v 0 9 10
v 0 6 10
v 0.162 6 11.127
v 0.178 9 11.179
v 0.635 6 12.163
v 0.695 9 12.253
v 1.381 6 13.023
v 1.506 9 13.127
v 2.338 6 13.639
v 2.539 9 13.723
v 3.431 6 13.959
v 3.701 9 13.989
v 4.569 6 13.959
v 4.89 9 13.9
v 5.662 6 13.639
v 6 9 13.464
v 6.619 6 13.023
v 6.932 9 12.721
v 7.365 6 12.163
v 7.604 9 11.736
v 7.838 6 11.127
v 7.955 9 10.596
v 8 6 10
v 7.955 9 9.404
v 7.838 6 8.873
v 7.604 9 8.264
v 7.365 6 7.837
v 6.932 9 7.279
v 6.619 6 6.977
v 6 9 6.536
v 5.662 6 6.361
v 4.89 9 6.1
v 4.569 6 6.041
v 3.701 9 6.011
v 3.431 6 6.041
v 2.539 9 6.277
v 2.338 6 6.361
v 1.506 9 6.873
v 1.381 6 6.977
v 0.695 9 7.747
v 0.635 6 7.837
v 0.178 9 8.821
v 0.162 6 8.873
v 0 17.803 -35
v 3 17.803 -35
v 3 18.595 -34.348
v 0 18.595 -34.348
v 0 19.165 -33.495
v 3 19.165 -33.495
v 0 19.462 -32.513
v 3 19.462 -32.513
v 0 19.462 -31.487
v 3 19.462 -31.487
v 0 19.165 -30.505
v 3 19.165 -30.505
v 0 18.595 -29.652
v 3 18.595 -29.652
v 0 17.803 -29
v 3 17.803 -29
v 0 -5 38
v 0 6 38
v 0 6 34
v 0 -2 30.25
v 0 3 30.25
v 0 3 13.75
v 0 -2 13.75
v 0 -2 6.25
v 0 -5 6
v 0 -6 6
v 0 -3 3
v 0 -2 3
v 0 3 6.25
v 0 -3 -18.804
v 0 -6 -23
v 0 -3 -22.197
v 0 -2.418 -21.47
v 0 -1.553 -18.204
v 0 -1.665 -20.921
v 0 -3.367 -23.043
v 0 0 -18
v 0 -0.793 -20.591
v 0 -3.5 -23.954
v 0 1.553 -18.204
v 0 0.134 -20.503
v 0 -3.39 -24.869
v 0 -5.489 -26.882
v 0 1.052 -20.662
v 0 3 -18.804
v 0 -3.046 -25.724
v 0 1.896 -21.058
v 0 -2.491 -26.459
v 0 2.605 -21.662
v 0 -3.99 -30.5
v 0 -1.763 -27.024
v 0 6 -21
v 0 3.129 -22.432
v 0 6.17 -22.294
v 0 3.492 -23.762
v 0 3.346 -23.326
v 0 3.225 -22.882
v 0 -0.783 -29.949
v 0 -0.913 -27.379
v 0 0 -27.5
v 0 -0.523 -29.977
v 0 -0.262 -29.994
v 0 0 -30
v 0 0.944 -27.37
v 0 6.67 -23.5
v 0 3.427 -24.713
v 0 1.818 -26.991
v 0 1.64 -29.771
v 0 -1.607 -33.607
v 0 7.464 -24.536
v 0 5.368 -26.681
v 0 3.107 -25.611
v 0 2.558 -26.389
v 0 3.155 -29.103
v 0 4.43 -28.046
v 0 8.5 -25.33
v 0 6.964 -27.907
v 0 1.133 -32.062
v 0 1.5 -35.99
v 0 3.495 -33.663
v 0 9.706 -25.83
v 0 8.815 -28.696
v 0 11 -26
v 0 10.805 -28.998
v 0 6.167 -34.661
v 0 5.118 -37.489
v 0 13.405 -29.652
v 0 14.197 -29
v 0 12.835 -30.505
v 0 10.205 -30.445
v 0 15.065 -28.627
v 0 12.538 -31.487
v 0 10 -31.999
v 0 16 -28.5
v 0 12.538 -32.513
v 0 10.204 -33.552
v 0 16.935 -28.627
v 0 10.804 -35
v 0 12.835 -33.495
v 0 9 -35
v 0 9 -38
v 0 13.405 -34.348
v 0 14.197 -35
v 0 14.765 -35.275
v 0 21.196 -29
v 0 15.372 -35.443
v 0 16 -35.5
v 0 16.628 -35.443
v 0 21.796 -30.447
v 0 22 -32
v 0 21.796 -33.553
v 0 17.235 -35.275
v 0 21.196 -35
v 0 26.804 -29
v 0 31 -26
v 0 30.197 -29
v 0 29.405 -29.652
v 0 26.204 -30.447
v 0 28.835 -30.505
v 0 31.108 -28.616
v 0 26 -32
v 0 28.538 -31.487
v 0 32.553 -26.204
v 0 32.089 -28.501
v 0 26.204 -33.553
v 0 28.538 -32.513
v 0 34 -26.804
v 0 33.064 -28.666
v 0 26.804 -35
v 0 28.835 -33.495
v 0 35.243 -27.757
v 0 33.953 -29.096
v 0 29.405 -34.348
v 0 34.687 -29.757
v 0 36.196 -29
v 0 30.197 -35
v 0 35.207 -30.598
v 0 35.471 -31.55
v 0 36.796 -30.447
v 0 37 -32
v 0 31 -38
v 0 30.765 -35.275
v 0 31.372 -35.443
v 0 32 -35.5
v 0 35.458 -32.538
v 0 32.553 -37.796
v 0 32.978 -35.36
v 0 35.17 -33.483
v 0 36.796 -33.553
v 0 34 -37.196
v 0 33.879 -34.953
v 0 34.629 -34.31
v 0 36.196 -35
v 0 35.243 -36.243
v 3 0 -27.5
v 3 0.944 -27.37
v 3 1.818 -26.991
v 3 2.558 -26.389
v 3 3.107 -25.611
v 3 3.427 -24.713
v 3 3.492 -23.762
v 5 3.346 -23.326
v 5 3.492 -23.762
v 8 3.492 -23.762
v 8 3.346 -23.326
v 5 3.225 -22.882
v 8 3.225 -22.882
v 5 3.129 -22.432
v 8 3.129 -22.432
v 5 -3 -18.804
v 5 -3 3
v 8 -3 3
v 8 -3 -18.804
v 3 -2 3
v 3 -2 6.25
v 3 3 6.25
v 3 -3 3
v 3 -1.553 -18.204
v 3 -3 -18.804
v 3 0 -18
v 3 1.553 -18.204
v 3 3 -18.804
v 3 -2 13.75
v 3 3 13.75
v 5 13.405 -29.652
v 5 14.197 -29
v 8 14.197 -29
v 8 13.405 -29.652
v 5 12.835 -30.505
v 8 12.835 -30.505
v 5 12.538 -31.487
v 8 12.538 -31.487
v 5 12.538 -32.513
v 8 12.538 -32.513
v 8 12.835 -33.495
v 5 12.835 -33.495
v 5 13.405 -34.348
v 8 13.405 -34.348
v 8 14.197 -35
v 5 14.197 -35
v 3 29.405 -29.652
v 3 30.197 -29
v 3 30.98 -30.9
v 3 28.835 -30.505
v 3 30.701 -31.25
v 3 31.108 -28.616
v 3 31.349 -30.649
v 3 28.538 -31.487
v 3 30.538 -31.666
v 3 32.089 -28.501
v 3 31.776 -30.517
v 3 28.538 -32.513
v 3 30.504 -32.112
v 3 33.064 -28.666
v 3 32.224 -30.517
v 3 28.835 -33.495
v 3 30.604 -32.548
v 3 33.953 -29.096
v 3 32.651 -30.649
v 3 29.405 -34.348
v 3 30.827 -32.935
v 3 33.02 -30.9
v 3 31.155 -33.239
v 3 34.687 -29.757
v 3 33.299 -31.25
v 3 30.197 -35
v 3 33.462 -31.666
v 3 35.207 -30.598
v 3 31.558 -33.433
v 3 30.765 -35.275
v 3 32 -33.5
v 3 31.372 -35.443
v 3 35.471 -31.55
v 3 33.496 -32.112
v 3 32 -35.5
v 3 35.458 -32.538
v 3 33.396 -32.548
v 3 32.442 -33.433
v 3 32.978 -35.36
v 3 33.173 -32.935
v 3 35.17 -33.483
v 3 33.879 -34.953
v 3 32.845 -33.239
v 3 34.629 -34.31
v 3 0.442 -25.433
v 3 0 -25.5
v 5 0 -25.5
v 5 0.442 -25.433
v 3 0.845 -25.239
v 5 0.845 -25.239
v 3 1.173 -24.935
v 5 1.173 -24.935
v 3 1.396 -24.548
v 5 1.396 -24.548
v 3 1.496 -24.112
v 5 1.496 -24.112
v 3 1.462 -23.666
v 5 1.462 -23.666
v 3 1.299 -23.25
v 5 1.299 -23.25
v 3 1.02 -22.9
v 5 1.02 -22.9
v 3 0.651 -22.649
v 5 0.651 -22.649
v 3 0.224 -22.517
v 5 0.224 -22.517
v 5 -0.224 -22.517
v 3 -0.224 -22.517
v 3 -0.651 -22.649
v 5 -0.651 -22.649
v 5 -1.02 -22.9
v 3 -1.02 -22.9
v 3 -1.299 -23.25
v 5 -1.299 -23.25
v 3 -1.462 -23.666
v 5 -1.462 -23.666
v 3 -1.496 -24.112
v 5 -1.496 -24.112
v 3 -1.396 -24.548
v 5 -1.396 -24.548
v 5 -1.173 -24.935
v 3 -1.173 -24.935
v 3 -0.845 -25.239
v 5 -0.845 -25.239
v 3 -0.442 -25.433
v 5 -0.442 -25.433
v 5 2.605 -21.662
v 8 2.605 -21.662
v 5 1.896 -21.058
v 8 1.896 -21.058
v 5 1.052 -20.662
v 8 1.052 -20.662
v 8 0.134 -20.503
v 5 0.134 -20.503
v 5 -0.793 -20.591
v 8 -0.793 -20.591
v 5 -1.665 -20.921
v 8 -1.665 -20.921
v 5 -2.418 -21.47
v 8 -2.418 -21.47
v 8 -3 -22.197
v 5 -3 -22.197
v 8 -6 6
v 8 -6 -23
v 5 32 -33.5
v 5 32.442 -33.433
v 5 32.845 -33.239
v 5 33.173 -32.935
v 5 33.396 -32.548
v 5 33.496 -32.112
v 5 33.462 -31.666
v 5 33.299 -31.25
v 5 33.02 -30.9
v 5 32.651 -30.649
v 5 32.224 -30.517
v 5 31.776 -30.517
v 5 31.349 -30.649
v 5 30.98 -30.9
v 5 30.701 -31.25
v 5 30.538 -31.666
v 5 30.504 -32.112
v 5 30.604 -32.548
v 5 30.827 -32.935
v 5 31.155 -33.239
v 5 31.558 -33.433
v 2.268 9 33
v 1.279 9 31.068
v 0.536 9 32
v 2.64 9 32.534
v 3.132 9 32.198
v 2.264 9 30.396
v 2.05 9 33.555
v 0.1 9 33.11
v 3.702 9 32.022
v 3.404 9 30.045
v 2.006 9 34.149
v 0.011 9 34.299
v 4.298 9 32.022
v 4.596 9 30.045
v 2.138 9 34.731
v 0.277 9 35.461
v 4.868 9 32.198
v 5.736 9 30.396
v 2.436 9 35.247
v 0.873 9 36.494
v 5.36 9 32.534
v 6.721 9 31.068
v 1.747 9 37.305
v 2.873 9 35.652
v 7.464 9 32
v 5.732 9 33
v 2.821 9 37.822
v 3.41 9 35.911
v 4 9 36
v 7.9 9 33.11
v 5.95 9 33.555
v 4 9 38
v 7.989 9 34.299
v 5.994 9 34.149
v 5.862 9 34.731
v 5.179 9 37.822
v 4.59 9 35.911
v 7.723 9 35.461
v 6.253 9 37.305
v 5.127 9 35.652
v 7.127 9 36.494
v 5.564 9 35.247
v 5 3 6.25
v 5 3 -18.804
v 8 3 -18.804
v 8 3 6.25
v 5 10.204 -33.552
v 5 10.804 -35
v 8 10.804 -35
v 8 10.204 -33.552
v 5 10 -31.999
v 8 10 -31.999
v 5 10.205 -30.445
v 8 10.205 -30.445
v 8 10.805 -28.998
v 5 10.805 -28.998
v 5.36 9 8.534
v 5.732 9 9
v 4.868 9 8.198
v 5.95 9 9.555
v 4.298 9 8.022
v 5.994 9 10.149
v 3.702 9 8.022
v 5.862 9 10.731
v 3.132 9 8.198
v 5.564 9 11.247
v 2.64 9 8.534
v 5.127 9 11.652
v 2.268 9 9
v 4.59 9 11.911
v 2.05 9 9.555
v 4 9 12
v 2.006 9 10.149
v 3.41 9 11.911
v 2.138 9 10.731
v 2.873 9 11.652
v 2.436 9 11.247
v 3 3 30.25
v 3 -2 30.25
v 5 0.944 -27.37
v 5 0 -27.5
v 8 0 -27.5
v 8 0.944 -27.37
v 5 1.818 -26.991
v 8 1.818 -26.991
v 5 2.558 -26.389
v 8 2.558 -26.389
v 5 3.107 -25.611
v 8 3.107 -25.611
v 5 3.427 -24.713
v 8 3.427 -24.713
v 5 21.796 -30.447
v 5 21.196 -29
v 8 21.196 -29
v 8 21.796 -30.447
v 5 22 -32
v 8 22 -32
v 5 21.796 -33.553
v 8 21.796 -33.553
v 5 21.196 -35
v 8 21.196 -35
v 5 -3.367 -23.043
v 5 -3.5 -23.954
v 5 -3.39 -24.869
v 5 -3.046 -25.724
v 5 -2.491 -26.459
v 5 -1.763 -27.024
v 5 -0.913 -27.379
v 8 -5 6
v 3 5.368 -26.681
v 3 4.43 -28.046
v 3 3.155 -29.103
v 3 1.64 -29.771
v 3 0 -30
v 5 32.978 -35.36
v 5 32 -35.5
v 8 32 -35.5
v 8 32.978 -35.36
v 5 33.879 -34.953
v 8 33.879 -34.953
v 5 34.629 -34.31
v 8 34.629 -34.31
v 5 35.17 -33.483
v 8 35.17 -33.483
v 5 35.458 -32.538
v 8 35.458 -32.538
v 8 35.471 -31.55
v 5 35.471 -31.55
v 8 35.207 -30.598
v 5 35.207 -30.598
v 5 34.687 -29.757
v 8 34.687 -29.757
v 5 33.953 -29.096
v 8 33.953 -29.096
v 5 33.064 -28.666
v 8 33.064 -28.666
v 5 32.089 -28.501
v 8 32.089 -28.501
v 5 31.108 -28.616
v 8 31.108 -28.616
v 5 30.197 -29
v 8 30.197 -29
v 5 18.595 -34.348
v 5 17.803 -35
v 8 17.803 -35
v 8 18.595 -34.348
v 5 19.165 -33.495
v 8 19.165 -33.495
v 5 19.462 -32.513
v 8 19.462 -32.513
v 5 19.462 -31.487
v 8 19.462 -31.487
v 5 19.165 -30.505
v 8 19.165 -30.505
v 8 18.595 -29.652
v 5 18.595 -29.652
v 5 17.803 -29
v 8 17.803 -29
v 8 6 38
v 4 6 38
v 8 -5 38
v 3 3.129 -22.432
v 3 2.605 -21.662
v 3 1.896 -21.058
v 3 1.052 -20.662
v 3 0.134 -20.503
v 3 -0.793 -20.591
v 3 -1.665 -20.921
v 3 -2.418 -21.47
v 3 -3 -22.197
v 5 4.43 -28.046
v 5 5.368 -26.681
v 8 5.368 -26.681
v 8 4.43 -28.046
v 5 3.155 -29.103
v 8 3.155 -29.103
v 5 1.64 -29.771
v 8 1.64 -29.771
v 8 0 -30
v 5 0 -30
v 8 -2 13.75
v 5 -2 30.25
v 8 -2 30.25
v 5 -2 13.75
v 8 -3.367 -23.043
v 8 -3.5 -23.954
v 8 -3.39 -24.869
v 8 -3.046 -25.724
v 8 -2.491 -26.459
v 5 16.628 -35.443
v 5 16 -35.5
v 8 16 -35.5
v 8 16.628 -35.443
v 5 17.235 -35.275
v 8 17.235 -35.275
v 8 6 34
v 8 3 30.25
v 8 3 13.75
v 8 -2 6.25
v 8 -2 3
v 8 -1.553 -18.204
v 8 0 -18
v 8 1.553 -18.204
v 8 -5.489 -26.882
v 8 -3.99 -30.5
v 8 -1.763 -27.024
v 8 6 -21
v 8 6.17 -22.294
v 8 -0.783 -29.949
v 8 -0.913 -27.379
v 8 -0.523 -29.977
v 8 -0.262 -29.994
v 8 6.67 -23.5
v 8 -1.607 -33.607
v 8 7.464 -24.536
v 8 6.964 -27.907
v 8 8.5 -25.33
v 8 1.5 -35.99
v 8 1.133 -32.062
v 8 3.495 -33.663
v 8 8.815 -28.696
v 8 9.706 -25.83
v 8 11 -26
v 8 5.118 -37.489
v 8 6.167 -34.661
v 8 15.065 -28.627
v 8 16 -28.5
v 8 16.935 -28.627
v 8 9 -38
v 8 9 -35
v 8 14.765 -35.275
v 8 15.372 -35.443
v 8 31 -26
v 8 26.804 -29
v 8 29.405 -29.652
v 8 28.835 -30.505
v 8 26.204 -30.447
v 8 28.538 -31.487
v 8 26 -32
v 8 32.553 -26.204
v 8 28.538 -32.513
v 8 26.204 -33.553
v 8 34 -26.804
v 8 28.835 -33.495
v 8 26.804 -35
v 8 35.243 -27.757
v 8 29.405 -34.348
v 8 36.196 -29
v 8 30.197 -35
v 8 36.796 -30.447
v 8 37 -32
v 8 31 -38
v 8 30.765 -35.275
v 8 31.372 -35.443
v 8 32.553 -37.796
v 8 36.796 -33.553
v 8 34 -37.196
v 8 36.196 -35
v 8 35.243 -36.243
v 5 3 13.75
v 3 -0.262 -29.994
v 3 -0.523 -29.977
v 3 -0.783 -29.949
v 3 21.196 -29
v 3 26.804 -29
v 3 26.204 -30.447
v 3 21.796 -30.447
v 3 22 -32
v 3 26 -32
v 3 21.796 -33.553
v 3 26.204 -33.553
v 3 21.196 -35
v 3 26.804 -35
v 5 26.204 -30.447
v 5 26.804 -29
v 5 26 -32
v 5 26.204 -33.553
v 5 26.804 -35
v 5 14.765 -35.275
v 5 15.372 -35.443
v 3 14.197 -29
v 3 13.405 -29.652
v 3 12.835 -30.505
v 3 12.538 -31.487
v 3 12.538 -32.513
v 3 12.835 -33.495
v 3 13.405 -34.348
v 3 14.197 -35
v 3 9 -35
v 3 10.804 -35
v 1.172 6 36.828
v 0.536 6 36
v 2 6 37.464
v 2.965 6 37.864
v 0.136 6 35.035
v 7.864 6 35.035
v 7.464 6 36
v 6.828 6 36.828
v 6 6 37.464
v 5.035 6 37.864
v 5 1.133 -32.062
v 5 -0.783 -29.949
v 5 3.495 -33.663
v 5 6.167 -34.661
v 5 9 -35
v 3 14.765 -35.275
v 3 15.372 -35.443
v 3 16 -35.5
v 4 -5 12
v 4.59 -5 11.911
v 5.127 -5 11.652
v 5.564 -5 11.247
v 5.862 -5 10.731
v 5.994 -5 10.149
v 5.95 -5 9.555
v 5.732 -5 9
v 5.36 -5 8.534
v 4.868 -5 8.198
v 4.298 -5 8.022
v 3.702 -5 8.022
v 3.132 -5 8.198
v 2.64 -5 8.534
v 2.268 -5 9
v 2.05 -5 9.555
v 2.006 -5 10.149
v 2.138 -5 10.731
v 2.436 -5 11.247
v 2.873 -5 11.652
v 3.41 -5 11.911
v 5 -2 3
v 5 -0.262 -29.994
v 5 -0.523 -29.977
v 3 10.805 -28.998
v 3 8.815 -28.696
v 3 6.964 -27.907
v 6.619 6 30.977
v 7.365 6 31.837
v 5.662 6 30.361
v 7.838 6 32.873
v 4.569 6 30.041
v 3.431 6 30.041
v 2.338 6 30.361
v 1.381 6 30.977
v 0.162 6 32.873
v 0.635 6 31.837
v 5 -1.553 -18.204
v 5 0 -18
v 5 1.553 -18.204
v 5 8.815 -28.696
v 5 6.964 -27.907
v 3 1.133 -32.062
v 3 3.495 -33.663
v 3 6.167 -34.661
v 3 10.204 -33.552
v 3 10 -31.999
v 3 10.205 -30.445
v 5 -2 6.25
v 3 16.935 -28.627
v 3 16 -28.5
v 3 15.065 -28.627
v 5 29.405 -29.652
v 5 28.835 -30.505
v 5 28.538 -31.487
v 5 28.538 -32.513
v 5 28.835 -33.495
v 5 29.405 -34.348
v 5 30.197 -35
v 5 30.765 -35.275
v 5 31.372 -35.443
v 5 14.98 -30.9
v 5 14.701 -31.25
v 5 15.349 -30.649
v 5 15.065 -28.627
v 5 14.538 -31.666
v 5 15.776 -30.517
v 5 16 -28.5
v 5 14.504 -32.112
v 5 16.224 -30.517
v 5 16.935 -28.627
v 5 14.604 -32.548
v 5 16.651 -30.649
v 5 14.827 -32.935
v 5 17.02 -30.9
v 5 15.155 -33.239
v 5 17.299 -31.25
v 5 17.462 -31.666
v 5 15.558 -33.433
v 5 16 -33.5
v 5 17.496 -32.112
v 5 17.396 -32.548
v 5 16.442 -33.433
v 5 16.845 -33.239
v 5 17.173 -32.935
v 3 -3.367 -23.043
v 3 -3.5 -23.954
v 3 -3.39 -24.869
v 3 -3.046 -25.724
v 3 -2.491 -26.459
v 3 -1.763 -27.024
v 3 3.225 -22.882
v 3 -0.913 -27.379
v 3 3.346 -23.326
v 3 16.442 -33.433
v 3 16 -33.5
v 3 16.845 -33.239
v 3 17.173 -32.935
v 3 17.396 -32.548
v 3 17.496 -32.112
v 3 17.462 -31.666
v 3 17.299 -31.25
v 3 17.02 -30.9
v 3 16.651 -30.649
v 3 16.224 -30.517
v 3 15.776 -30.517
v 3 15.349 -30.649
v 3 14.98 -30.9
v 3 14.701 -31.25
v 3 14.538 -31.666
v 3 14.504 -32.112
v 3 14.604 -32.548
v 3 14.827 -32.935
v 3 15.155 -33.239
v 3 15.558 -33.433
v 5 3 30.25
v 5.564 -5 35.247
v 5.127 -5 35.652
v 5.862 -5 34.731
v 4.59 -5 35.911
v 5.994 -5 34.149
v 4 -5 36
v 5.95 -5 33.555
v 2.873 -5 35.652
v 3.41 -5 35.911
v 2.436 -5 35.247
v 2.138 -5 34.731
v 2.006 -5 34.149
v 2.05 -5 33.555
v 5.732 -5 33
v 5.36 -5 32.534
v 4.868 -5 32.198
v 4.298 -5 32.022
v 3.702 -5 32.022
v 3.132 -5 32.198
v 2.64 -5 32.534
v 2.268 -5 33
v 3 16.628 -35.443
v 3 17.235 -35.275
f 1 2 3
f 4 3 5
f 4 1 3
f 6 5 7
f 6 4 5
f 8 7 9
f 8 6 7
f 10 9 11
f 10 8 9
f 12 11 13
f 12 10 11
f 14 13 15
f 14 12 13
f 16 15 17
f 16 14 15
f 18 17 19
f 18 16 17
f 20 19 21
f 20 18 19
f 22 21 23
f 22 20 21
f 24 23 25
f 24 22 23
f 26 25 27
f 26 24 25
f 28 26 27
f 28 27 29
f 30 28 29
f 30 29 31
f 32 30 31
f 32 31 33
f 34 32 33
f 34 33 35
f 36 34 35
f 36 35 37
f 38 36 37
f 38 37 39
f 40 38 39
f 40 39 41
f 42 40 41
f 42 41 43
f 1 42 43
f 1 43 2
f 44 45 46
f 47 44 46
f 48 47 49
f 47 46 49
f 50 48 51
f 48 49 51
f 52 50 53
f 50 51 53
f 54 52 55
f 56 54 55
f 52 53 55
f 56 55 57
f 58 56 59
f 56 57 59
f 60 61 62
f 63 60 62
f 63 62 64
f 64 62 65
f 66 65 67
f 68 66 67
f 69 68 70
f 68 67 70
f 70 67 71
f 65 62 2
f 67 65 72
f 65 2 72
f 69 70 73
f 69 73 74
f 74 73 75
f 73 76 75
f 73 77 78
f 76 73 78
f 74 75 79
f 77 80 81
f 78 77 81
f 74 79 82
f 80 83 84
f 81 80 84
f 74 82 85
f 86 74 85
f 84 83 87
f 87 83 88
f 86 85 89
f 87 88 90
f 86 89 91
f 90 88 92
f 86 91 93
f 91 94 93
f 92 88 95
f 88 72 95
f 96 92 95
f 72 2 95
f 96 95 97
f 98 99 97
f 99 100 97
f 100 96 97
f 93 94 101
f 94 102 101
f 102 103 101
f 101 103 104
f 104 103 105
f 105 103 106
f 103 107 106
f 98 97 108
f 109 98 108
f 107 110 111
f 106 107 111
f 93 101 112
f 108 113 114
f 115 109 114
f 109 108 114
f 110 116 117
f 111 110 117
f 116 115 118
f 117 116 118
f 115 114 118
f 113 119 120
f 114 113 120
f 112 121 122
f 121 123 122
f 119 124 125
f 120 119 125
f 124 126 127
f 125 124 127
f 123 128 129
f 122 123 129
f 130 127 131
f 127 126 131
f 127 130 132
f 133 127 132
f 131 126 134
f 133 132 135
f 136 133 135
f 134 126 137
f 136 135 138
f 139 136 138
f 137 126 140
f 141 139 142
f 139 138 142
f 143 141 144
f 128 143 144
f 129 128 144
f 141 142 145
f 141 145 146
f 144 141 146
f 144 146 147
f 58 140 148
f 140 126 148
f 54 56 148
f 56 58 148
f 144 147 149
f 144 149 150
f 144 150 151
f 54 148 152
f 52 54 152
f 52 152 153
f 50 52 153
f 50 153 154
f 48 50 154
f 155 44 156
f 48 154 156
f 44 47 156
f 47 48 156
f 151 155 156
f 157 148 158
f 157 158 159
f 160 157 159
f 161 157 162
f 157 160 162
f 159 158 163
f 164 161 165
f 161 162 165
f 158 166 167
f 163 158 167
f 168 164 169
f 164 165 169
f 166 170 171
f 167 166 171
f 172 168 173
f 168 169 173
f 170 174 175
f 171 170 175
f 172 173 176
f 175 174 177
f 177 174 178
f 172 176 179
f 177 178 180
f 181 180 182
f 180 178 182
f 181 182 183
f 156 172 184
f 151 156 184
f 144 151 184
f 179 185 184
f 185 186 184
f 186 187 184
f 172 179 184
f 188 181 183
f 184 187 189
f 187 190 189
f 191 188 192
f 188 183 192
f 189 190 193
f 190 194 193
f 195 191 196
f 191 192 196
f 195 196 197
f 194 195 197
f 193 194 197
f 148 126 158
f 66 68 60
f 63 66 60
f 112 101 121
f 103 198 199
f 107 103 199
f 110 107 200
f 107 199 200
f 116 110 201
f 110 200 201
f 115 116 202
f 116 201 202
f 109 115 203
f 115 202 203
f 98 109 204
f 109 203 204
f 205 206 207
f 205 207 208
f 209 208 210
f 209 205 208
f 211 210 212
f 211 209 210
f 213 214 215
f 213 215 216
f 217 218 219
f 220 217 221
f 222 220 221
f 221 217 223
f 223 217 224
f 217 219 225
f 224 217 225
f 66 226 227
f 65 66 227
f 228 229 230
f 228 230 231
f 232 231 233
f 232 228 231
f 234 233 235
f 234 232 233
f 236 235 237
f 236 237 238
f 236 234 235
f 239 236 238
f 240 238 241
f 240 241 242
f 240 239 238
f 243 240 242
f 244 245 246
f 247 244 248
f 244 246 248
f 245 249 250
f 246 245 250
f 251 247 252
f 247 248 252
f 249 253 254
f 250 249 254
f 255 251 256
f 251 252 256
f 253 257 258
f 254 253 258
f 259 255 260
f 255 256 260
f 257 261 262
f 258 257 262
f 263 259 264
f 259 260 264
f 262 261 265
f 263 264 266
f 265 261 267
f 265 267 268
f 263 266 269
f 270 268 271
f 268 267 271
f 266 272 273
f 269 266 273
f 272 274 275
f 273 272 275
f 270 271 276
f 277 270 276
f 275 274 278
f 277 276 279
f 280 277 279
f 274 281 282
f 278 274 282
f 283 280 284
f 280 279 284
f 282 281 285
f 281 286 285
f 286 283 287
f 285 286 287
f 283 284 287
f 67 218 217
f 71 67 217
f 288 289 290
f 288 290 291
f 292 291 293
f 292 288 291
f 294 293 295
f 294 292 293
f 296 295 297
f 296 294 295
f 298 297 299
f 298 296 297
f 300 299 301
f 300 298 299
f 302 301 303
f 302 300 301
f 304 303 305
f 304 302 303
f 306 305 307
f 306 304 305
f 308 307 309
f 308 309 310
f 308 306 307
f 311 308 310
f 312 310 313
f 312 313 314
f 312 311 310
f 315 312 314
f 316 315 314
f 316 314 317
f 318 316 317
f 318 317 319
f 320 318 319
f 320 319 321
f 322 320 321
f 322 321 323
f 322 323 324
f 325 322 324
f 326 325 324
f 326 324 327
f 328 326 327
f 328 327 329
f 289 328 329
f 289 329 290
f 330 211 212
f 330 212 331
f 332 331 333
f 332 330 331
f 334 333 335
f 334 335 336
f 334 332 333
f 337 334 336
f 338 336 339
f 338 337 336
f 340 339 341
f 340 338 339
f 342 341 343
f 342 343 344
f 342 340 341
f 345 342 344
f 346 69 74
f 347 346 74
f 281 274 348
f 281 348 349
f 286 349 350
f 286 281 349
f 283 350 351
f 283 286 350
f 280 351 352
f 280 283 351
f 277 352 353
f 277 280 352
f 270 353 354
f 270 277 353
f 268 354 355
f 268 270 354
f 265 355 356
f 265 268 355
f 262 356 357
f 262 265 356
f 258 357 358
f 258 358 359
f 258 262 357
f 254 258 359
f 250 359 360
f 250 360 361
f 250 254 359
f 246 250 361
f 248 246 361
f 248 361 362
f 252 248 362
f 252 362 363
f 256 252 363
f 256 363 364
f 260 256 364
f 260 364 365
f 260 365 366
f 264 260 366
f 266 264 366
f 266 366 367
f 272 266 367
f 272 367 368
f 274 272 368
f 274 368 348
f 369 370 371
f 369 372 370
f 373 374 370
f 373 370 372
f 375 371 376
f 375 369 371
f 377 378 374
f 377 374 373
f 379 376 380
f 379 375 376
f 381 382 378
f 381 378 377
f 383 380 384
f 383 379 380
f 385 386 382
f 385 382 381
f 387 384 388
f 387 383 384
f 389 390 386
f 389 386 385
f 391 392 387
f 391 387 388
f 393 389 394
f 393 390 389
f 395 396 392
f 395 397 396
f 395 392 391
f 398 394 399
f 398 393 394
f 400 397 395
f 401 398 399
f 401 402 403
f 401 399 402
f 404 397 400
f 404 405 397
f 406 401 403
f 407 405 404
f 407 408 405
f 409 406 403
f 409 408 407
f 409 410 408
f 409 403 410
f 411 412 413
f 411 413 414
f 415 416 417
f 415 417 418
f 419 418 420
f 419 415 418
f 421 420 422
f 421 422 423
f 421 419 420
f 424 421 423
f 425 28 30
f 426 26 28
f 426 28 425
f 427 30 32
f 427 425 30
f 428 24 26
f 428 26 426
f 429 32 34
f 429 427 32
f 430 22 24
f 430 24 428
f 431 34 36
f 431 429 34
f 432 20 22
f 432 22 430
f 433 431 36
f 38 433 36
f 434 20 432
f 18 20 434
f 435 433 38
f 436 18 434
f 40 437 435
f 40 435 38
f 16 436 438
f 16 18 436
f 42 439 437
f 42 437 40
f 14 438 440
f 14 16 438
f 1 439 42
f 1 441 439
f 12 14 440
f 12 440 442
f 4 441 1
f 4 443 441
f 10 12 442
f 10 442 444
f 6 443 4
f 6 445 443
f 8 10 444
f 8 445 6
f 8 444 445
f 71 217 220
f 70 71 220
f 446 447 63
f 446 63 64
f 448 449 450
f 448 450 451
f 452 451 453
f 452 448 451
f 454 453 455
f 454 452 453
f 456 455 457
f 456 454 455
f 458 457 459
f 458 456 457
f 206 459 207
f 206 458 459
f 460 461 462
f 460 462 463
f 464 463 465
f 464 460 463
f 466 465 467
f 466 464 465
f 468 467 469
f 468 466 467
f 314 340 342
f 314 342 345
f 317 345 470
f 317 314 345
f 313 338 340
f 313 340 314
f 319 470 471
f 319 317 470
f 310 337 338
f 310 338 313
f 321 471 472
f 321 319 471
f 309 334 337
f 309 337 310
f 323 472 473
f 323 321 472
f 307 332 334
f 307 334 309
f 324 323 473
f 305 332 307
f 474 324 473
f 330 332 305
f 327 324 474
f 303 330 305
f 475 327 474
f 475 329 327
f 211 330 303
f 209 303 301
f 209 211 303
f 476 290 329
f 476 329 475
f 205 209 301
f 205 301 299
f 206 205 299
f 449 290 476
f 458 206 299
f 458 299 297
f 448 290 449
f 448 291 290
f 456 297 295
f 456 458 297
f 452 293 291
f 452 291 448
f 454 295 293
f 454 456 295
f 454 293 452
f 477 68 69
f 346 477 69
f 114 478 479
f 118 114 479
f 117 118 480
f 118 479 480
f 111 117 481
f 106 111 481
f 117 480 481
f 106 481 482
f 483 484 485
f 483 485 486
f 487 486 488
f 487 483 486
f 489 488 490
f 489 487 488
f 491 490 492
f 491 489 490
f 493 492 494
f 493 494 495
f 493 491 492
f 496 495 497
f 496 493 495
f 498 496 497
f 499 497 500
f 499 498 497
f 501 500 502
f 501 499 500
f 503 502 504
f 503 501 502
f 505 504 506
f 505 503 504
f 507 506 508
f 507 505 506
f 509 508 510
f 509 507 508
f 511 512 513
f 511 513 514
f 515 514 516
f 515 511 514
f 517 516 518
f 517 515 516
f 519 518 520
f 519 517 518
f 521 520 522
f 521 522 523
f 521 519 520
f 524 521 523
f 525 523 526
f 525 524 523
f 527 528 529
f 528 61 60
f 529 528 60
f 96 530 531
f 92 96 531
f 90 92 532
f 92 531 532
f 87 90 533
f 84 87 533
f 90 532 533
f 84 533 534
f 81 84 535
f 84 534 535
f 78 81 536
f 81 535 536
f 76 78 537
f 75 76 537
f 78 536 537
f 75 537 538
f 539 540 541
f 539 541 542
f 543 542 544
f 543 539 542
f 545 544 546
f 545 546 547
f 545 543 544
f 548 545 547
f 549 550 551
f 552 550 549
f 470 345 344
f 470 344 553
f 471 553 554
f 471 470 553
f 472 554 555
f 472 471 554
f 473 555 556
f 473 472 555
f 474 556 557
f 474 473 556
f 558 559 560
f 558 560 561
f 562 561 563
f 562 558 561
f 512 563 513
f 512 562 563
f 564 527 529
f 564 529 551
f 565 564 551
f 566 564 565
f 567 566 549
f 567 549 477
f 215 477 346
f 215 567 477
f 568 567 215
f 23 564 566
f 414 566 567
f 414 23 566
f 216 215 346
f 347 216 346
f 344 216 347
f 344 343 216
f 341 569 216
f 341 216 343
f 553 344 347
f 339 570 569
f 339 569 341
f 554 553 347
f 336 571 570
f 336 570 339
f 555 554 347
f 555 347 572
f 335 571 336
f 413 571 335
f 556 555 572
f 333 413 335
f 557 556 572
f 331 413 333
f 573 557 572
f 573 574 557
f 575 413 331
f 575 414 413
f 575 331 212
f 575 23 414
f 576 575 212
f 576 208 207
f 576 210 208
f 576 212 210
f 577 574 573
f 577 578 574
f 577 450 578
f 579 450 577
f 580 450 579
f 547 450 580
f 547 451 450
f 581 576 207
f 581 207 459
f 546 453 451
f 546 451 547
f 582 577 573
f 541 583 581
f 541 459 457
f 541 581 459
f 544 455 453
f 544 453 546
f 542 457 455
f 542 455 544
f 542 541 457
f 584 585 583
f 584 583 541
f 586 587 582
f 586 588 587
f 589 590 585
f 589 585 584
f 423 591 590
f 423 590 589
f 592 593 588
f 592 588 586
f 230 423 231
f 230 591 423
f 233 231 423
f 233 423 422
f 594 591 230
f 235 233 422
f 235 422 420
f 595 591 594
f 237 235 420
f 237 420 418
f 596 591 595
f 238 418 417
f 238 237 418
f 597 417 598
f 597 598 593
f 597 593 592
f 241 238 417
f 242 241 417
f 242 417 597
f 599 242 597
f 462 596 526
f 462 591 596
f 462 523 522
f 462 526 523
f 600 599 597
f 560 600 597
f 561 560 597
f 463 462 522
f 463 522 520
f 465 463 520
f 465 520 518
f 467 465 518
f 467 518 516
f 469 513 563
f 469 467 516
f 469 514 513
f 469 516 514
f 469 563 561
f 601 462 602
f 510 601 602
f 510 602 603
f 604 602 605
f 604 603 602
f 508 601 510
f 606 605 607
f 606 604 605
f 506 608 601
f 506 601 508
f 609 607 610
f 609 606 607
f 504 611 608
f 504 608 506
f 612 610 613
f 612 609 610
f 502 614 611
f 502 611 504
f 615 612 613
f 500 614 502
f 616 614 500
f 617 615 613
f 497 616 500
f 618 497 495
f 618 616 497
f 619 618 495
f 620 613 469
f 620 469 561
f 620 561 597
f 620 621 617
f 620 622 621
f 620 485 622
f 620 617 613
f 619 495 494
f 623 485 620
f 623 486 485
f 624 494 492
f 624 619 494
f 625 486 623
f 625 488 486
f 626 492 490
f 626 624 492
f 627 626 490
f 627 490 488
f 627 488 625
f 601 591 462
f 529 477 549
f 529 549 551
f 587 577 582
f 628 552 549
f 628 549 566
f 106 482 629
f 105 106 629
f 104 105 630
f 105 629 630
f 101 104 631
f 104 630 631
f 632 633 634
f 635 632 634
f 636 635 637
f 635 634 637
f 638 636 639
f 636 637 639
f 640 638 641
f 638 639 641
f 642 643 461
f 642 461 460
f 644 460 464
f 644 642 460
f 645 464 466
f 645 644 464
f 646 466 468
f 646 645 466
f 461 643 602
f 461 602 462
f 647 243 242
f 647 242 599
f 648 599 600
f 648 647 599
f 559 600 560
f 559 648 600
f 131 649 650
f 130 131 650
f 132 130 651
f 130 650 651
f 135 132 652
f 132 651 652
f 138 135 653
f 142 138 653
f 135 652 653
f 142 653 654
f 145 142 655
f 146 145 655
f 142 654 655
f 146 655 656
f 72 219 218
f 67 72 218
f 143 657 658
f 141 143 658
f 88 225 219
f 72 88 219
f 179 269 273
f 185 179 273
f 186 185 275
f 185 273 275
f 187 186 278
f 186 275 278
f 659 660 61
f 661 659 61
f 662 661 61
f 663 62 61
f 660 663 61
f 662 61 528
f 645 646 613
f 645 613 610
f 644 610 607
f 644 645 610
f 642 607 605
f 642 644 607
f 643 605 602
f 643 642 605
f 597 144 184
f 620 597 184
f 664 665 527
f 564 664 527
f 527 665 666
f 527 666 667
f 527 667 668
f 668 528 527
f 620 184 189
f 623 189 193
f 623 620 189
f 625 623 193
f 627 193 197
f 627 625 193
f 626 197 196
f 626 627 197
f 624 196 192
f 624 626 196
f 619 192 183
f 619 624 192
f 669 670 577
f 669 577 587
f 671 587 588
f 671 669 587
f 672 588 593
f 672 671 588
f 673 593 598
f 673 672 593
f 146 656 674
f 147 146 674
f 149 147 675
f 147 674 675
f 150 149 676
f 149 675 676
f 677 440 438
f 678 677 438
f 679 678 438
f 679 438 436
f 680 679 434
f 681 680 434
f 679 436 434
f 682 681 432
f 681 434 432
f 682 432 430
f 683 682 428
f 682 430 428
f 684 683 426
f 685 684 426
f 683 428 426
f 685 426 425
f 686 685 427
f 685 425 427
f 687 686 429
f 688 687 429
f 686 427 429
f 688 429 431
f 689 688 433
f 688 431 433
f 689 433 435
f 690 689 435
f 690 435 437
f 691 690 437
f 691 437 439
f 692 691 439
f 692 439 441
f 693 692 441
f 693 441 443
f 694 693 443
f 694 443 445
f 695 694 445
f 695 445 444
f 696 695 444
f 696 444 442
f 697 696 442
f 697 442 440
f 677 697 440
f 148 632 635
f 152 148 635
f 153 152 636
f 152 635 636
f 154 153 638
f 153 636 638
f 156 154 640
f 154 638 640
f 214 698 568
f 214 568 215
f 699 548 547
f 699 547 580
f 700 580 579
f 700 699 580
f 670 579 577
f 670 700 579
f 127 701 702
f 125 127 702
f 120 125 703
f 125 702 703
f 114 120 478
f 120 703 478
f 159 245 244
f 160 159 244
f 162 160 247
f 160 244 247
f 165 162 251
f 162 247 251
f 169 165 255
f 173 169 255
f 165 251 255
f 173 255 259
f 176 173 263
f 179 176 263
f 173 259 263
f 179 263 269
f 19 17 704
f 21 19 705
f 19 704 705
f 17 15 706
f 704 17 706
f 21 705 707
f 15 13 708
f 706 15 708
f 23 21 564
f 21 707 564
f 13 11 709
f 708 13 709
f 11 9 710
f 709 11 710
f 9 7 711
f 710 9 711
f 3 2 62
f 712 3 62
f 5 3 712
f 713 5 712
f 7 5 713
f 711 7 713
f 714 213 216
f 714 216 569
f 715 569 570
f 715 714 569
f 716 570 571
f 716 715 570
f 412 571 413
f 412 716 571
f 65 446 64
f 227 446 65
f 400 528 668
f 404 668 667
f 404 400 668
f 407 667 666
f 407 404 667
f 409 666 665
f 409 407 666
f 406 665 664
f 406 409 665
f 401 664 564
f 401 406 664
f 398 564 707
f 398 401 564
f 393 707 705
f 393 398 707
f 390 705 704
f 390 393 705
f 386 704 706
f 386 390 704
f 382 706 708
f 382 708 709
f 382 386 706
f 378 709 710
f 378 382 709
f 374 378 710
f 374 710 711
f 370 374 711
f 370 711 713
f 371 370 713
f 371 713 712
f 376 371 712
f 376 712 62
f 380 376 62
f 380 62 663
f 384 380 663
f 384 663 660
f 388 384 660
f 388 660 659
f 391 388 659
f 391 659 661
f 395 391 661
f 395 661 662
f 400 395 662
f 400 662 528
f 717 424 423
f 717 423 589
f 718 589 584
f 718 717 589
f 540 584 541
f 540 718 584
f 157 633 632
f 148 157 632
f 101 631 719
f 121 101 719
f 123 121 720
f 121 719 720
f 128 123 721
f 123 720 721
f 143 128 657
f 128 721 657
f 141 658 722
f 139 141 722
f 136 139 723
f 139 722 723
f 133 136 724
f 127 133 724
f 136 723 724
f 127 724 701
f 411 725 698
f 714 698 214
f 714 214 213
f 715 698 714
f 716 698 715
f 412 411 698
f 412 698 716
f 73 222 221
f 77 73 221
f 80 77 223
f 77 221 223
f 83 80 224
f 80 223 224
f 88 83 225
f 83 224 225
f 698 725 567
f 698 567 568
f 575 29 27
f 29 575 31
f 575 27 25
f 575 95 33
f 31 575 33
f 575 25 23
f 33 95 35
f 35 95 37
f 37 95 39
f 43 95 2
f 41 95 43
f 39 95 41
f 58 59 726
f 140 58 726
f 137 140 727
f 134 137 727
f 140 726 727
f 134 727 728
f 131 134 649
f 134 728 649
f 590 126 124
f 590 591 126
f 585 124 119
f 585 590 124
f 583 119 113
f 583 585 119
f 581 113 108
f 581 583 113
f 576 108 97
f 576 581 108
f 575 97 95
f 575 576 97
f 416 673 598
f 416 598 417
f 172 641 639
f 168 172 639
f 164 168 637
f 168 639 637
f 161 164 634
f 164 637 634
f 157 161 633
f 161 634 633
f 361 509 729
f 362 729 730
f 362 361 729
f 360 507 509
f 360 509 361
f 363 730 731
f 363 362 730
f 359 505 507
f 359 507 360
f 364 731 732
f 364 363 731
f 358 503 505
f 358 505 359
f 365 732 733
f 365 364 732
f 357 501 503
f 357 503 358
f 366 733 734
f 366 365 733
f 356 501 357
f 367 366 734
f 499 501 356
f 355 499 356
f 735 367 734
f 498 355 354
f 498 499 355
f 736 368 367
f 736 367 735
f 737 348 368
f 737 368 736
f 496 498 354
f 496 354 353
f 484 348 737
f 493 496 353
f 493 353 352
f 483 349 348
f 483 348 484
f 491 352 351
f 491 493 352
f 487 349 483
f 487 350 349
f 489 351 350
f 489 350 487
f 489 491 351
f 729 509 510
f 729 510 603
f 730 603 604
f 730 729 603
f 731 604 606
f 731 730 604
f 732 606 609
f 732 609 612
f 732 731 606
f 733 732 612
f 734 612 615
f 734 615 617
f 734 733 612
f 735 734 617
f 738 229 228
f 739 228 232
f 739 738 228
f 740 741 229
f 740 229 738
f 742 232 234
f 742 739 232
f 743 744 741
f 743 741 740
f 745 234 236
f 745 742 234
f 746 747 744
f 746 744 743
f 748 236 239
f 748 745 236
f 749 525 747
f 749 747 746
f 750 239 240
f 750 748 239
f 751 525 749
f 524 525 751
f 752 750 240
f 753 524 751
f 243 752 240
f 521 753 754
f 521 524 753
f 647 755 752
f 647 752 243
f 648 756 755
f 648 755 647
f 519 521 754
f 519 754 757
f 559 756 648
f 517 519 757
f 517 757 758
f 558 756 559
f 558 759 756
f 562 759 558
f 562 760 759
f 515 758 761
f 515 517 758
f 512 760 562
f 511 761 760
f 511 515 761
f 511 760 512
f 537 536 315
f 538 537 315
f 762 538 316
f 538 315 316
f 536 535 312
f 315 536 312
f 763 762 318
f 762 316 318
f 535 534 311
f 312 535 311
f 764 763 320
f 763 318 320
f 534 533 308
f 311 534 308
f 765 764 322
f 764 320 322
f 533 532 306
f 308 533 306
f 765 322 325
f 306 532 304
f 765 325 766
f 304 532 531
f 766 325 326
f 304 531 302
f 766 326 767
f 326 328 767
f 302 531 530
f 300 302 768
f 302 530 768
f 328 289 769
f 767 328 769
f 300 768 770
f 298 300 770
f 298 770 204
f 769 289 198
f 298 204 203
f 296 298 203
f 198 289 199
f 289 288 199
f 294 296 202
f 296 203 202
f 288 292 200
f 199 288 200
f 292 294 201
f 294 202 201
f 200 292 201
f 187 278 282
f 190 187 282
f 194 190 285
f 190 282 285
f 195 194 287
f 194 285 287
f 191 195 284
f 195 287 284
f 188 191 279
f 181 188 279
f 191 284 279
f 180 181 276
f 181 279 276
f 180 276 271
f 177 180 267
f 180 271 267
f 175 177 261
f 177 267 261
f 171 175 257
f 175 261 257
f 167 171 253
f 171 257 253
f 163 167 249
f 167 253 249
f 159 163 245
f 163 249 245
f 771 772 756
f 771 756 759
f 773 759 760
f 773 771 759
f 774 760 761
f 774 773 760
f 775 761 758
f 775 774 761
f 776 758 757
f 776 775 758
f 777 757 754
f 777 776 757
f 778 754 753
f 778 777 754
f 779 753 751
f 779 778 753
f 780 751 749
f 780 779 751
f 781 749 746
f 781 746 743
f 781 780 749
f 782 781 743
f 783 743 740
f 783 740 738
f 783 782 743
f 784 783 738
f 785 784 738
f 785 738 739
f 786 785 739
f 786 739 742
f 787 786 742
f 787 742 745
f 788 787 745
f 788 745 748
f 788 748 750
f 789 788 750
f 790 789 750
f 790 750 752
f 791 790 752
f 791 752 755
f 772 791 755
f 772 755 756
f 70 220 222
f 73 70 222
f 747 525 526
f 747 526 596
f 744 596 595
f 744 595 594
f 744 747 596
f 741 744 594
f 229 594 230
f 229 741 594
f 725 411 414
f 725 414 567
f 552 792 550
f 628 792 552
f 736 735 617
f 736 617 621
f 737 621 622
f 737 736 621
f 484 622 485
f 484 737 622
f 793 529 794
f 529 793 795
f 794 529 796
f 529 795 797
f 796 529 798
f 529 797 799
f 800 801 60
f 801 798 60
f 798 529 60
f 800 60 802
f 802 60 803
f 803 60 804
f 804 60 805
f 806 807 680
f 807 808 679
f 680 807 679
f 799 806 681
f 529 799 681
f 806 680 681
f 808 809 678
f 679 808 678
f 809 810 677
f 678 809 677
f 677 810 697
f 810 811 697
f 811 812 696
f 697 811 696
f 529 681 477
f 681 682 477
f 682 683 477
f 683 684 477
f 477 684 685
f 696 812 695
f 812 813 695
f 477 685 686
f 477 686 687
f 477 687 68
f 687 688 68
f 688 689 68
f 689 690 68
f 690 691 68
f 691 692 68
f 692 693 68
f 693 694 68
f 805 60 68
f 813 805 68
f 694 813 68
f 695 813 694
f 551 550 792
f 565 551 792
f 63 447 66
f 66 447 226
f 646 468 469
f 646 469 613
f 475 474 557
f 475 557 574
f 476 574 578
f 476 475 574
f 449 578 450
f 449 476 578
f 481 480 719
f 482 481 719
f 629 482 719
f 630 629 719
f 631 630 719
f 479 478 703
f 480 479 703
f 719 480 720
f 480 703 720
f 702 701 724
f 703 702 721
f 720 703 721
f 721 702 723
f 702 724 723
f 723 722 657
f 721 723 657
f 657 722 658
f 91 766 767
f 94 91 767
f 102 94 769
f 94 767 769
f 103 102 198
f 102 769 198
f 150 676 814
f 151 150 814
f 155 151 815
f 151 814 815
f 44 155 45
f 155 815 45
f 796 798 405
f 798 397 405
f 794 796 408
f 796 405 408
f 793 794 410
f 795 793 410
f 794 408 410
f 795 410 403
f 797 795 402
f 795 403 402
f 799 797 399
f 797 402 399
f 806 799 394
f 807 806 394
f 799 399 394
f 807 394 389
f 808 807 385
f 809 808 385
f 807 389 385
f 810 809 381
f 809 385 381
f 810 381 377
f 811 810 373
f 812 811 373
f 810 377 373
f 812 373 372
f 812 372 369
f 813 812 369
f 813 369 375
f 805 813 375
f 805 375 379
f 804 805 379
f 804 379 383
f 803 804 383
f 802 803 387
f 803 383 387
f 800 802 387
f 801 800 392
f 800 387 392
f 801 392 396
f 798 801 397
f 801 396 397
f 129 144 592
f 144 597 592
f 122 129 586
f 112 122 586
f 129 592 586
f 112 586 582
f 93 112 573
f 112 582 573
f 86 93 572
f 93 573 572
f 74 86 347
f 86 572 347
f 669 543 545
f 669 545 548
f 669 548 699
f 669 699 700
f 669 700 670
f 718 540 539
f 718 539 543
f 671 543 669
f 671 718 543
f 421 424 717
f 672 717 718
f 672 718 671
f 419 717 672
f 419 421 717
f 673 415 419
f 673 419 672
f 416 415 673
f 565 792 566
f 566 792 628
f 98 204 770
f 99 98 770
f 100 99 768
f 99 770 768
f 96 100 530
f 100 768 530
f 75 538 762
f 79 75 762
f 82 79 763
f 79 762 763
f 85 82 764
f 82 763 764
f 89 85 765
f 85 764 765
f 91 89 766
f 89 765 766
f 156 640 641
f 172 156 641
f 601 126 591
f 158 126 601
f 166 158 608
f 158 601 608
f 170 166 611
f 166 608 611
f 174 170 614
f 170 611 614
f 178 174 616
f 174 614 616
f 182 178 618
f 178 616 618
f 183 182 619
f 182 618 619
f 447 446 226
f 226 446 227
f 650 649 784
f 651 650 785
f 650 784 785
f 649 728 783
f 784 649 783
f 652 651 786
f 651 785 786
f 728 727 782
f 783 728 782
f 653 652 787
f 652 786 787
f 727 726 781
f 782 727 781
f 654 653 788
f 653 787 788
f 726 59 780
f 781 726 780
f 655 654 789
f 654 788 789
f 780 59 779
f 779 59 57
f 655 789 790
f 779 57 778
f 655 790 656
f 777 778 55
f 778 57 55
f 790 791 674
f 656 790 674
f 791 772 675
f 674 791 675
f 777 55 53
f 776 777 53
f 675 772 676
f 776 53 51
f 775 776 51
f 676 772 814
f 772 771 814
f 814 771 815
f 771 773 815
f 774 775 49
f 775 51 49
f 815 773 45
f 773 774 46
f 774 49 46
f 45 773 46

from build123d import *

# Parameters (mm, degrees)
SKETCH1_R           = 1.5
SKETCH1_W           = 12
SKETCH1_H           = 31
BOSS_EXTRUDE1_DEPTH = 8
FILLET1_R           = 6
FILLET2_R           = 15
FILLET3_R           = 5
SKETCH2_R           = 2
CUT_EXTRUDE1_DEPTH  = 50.689032995
BOSS_EXTRUDE2_START = 3
SKETCH3_R           = 4
SKETCH3_R_2         = 2
BOSS_EXTRUDE2_DEPTH = 3
CUT_EXTRUDE2_START  = -3
SKETCH4_W           = 16.5
SKETCH4_H           = 5
SKETCH4_R           = 1.5
CUT_EXTRUDE2_DEPTH  = 3


with BuildPart() as part:
    # Sketch1 → Boss-Extrude1 (new body)
    # profile 1 of 2: a face of its own
    with BuildSketch(Plane(origin=(0, 0, 0), x_dir=(0, 0, -1), z_dir=(1, 0, 0))):
        Polygon((-6, -5), (-6, -6), (38, -6), (38, 6), (26, 6), (-38, 6), (-38, -5), align=None)
        with Locations((24, 0)):
            Circle(SKETCH1_R, mode=Mode.SUBTRACT)
    # profile 2 of 2: a face of its own
    with BuildSketch(Plane(origin=(0, 0, 0), x_dir=(0, 0, -1), z_dir=(1, 0, 0))):
        with Locations((32, 21.5)):
            Rectangle(SKETCH1_W, SKETCH1_H)
        with Locations((32, 16)):
            Circle(SKETCH1_R, mode=Mode.SUBTRACT)
        with Locations((32, 32)):
            Circle(SKETCH1_R, mode=Mode.SUBTRACT)
    extrude(amount=BOSS_EXTRUDE1_DEPTH)

    # Fillet1
    fillet1_edges = [part.edges().sort_by_distance(p)[0] for p in [
        (4, 37, -26),
        (4, 37, -38),
    ]]
    fillet(fillet1_edges, radius=FILLET1_R - 0.0001)  # a hair under: the kernel refuses the full size

    # Fillet2
    fillet2_edges = [part.edges().sort_by_distance(p)[0] for p in [
        (4, -6, -38),
    ]]
    fillet(fillet2_edges, radius=FILLET2_R)

    # Fillet3
    fillet3_edges = [part.edges().sort_by_distance(p)[0] for p in [
        (4, 6, -26),
    ]]
    fillet(fillet3_edges, radius=FILLET3_R)

    # Sketch2 → Cut-Extrude1 (cut, through all)
    with BuildSketch(Plane(origin=(0, 6, 0), x_dir=(1, 0, 0), z_dir=(0, 1, 0))):
        with Locations(Location((4, -34, 0), (0, 0, 270))):
            Circle(SKETCH2_R)
        with Locations(Location((4, -10, 0), (0, 0, 270))):
            Circle(SKETCH2_R)
    extrude(amount=-CUT_EXTRUDE1_DEPTH, mode=Mode.SUBTRACT)

    # Sketch3 → Boss-Extrude2 (add)
    # profile 1 of 2: a face of its own
    with BuildSketch(Plane(origin=(0, 6, 0), x_dir=(1, 0, 0), z_dir=(0, 1, 0)).offset(BOSS_EXTRUDE2_START)):
        with Locations(Location((4, -10, 0), (0, 0, 180))):
            Circle(SKETCH3_R)
        with Locations(Location((4, -10, 0), (0, 0, 270))):
            Circle(SKETCH3_R_2, mode=Mode.SUBTRACT)
    # profile 2 of 2: a face of its own
    with BuildSketch(Plane(origin=(0, 6, 0), x_dir=(1, 0, 0), z_dir=(0, 1, 0)).offset(BOSS_EXTRUDE2_START)):
        with Locations(Location((4, -34, 0), (0, 0, 270))):
            Circle(SKETCH3_R)
        with Locations(Location((4, -34, 0), (0, 0, 270))):
            Circle(SKETCH3_R_2, mode=Mode.SUBTRACT)
    extrude(amount=-BOSS_EXTRUDE2_DEPTH)

    # Sketch4 → Cut-Extrude2 (cut)
    # profile 1 of 11: a face of its own
    with BuildSketch(Plane(origin=(8, 0, 0), x_dir=(0, 0, -1), z_dir=(1, 0, 0)).offset(CUT_EXTRUDE2_START)):
        with BuildLine():
            Line((-6.25, 3), (-6.25, -2))
            Line((-6.25, -2), (-3, -2))
            Line((-3, -2), (-3, -3))
            Line((-3, -3), (18.803847577, -3))
            ThreePointArc((18.803847577, -3), (18, 0), (18.803847577, 3))
            Line((18.803847577, 3), (-6.25, 3))
        make_face()
    # profile 2 of 11: a face of its own
    with BuildSketch(Plane(origin=(8, 0, 0), x_dir=(0, 0, -1), z_dir=(1, 0, 0)).offset(CUT_EXTRUDE2_START)):
        with Locations((-22, 0.5)):
            Rectangle(SKETCH4_W, SKETCH4_H)
    # profile 3 of 11: a face of its own
    with BuildSketch(Plane(origin=(8, 0, 0), x_dir=(0, 0, -1), z_dir=(1, 0, 0)).offset(CUT_EXTRUDE2_START)):
        with BuildLine():
            ThreePointArc((28.997628386, 10.805217551), (28.359995566, 7.86464272), (26.681204439, 5.367601211))
            ThreePointArc((26.681204439, 5.367601211), (29.103294359, 3.155374254), (30, 0))
            ThreePointArc((30, 0), (29.98714269, -0.392584271), (29.948625864, -0.783486015))
            ThreePointArc((29.948625864, -0.783486015), (33.662633595, 3.494707563), (35, 9))
            Line((35, 9), (35, 10.803847577))
            ThreePointArc((35, 10.803847577), (31.998630567, 10.000000156), (28.997628386, 10.805217551))
        make_face()
    # profile 4 of 11: a face of its own
    with BuildSketch(Plane(origin=(8, 0, 0), x_dir=(0, 0, -1), z_dir=(1, 0, 0)).offset(CUT_EXTRUDE2_START)):
        with BuildLine():
            Line((29, 26.803847577), (29, 21.196152423))
            ThreePointArc((29, 21.196152423), (32, 22), (35, 21.196152423))
            Line((35, 21.196152423), (35, 26.803847577))
            ThreePointArc((35, 26.803847577), (32, 26), (29, 26.803847577))
        make_face()
    # profile 5 of 11: a face of its own
    with BuildSketch(Plane(origin=(8, 0, 0), x_dir=(0, 0, -1), z_dir=(1, 0, 0)).offset(CUT_EXTRUDE2_START)):
        with BuildLine():
            Line((29, 31), (29, 30.197224362))
            ThreePointArc((29, 30.197224362), (32, 28.5), (35, 30.197224362))
            Line((35, 30.197224362), (35, 31))
            ThreePointArc((35, 31), (34.121320344, 33.121320344), (32, 34))
            ThreePointArc((32, 34), (29.878679656, 33.121320344), (29, 31))
        make_face()
        with Locations((32, 32)):
            Circle(SKETCH4_R, mode=Mode.SUBTRACT)
    # profile 6 of 11: a face of its own
    with BuildSketch(Plane(origin=(8, 0, 0), x_dir=(0, 0, -1), z_dir=(1, 0, 0)).offset(CUT_EXTRUDE2_START)):
        with BuildLine():
            ThreePointArc((35.5, 32), (31.064585653, 35.372684391), (29, 30.197224362))
            Line((29, 30.197224362), (29, 31))
            ThreePointArc((29, 31), (29.878679656, 33.121320344), (32, 34))
            ThreePointArc((32, 34), (34.121320344, 33.121320344), (35, 31))
            Line((35, 31), (35, 30.197224362))
            ThreePointArc((35, 30.197224362), (35.372684391, 31.064585653), (35.5, 32))
        make_face()
    # profile 7 of 11: a face of its own
    with BuildSketch(Plane(origin=(8, 0, 0), x_dir=(0, 0, -1), z_dir=(1, 0, 0)).offset(CUT_EXTRUDE2_START)):
        with BuildLine():
            ThreePointArc((35, 17.802775638), (32, 19.5), (29, 17.802775638))
            Line((29, 17.802775638), (29, 14.197224362))
            ThreePointArc((29, 14.197224362), (32, 12.5), (35, 14.197224362))
            Line((35, 14.197224362), (35, 17.802775638))
        make_face()
        with Locations((32, 16)):
            Circle(SKETCH4_R, mode=Mode.SUBTRACT)
    # profile 8 of 11: a face of its own
    with BuildSketch(Plane(origin=(8, 0, 0), x_dir=(0, 0, -1), z_dir=(1, 0, 0)).offset(CUT_EXTRUDE2_START)):
        with BuildLine():
            Line((35, 17.802775638), (35, 14.197224362))
            ThreePointArc((35, 14.197224362), (35.372684391, 15.064585653), (35.5, 16))
            ThreePointArc((35.5, 16), (35.372684391, 16.935414347), (35, 17.802775638))
        make_face()
    # profile 9 of 11: a face of its own
    with BuildSketch(Plane(origin=(8, 0, 0), x_dir=(0, 0, -1), z_dir=(1, 0, 0)).offset(CUT_EXTRUDE2_START)):
        with BuildLine():
            Line((29, 14.197224362), (29, 17.802775638))
            ThreePointArc((29, 17.802775638), (28.5, 16), (29, 14.197224362))
        make_face()
    # profile 10 of 11: a face of its own
    with BuildSketch(Plane(origin=(8, 0, 0), x_dir=(0, 0, -1), z_dir=(1, 0, 0)).offset(CUT_EXTRUDE2_START)):
        with BuildLine():
            ThreePointArc((23.761948832, 3.491895136), (23.104939246, 3.28188943), (22.432281937, 3.12925871))
            ThreePointArc((22.432281937, 3.12925871), (20.50257094, 0.134126691), (22.197224362, -3))
            Line((22.197224362, -3), (23, -3))
            ThreePointArc((23, -3), (24.748137439, -2.87198448), (26.458976757, -2.490669249))
            ThreePointArc((26.458976757, -2.490669249), (27.229273808, -1.349737262), (27.5, 0))
            ThreePointArc((27.5, 0), (26.389228004, 2.557653132), (23.761948832, 3.491895136))
        make_face()
        with Locations((24, 0)):
            Circle(SKETCH4_R, mode=Mode.SUBTRACT)
    # profile 11 of 11: a face of its own
    with BuildSketch(Plane(origin=(8, 0, 0), x_dir=(0, 0, -1), z_dir=(1, 0, 0)).offset(CUT_EXTRUDE2_START)):
        with BuildLine():
            Line((23, -3), (22.197224362, -3))
            ThreePointArc((22.197224362, -3), (24.415336527, -3.475269136), (26.458976757, -2.490669249))
            ThreePointArc((26.458976757, -2.490669249), (24.748137439, -2.87198448), (23, -3))
        make_face()
    cut_extrude2 = extrude(amount=CUT_EXTRUDE2_DEPTH, mode=Mode.SUBTRACT)

    # Mirror1: Cut-Extrude2 across plane
    add(cut_extrude2.mirror(Plane.ZY.offset(-4)), mode=Mode.SUBTRACT)


solid = part.part
